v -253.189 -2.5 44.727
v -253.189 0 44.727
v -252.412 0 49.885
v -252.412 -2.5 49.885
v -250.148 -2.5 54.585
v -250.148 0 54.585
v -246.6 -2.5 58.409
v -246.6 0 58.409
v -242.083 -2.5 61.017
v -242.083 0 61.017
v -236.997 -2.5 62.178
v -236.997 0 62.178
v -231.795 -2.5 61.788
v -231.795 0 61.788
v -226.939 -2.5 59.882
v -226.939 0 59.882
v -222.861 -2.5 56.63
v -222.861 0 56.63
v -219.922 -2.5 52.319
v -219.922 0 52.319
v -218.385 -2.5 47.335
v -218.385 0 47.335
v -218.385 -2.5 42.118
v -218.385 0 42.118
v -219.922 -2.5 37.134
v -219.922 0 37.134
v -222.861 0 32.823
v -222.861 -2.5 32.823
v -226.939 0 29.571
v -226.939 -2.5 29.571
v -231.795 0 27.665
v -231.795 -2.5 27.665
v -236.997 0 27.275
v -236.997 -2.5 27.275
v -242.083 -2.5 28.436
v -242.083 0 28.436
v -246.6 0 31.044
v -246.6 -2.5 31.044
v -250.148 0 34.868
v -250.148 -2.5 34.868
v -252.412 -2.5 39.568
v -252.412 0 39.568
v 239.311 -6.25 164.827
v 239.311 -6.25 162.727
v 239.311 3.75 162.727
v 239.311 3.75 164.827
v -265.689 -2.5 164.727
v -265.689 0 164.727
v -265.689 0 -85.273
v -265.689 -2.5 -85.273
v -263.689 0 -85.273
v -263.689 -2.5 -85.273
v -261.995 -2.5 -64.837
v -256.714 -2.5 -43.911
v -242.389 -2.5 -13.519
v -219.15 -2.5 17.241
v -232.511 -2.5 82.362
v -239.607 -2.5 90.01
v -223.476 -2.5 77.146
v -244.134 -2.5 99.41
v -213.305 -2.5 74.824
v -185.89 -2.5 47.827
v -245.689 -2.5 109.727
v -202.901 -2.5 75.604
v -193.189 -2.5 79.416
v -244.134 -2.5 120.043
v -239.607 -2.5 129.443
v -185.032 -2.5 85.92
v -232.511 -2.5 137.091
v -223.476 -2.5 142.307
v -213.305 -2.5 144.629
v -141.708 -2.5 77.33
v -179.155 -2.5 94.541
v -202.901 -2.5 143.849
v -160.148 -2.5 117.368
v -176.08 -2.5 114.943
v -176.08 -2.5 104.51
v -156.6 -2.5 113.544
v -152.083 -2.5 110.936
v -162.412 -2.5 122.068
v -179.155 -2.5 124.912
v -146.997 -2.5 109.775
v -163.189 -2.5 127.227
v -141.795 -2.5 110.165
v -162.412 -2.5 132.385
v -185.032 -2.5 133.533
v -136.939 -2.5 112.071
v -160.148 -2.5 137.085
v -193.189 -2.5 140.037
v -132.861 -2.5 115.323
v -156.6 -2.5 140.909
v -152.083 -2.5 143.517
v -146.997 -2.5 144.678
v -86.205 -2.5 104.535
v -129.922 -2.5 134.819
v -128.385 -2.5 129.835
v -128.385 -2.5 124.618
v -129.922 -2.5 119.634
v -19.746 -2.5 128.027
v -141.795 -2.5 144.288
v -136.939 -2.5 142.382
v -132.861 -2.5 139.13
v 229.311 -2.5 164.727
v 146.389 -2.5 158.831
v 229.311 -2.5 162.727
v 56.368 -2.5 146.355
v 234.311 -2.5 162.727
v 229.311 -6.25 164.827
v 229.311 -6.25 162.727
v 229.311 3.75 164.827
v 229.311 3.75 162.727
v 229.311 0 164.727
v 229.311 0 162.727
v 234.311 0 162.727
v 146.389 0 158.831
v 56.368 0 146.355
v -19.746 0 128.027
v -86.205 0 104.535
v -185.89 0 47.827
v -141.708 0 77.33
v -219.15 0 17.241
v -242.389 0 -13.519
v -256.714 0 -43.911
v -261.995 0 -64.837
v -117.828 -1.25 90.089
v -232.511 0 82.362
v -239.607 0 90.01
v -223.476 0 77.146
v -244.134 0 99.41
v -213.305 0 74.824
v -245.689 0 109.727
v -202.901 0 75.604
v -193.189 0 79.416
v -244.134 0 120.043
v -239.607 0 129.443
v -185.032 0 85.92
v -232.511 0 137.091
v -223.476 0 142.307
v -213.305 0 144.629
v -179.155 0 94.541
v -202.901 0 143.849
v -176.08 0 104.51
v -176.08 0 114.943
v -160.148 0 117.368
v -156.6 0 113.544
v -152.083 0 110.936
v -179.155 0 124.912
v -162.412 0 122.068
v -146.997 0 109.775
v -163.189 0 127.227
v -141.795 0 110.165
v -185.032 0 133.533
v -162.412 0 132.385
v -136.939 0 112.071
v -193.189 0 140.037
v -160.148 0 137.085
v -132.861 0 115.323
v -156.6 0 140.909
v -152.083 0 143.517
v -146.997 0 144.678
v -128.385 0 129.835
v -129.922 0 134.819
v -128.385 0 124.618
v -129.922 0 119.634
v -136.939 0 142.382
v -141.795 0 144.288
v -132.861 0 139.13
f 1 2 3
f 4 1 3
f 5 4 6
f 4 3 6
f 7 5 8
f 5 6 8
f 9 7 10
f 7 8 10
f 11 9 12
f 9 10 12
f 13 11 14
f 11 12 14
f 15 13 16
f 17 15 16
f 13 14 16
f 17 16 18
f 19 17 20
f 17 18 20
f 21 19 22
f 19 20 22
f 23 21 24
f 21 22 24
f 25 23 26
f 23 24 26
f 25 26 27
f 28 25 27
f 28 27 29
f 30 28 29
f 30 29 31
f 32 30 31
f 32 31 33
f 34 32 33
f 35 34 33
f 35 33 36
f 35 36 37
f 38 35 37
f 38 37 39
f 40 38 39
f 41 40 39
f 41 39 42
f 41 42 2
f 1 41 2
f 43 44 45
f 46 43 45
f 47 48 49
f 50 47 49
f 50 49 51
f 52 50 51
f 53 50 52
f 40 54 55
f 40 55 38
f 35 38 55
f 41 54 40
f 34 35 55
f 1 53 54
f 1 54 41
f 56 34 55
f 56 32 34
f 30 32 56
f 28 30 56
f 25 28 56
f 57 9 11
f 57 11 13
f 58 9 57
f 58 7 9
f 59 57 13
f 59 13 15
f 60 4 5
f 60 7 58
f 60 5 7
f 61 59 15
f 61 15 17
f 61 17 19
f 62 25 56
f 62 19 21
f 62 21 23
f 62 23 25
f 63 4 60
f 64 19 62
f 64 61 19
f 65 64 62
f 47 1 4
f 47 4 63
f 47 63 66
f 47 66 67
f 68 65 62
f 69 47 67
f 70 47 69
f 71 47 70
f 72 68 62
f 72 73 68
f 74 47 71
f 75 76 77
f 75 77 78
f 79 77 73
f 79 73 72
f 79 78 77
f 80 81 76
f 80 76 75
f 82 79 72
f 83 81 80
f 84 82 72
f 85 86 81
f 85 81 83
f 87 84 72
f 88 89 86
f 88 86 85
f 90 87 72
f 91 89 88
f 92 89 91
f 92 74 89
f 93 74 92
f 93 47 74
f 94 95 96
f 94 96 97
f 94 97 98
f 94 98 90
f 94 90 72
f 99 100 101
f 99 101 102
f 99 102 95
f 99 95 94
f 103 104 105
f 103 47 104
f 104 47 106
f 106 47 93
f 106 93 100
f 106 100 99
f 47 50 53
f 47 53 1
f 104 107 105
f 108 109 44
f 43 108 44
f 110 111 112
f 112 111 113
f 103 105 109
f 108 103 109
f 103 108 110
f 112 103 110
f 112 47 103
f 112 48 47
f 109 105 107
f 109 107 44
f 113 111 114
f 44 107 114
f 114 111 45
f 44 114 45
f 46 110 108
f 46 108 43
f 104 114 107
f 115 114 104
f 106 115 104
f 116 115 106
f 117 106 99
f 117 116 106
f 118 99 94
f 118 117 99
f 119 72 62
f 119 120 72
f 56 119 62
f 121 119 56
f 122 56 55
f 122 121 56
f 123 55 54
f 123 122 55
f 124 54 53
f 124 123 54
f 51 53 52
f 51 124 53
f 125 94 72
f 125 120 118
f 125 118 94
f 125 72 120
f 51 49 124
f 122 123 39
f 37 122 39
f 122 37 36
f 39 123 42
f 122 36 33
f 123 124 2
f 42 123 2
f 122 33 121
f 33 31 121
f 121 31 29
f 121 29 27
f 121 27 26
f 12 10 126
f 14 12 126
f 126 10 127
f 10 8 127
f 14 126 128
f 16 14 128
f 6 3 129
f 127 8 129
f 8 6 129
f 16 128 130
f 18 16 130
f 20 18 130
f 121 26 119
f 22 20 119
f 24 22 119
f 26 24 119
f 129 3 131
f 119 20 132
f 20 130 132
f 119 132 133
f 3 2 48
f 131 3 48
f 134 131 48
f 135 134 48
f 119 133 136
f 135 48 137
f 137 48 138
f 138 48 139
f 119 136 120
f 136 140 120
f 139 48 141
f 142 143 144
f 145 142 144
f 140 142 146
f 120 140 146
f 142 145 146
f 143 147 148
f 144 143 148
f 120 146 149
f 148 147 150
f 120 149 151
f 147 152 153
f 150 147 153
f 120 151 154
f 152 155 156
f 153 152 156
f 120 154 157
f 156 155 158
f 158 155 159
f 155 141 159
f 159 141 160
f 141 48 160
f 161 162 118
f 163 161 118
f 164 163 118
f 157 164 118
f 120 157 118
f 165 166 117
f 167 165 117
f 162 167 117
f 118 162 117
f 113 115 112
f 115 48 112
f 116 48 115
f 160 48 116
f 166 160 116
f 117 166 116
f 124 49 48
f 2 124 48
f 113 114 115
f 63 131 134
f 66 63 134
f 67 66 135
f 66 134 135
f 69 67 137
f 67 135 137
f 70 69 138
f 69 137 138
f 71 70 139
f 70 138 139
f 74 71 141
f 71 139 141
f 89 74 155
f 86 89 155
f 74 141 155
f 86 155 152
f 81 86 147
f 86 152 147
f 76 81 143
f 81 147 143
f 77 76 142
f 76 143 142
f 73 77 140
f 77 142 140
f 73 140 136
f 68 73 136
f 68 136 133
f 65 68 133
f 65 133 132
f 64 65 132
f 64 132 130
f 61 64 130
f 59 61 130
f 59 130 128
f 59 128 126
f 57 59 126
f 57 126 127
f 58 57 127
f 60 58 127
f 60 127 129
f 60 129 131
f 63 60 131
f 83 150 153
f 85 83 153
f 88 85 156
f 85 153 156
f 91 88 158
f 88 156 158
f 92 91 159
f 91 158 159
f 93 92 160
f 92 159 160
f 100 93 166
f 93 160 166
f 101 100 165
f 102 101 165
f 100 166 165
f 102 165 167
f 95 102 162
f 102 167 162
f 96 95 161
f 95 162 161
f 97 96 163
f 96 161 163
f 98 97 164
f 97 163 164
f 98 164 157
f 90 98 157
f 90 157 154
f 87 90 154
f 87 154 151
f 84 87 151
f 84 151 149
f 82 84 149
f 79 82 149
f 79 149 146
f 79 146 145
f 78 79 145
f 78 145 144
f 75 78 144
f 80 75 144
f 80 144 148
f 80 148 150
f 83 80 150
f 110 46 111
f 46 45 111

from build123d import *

# Parameters (mm, degrees)
F1_DEPTH = 2.5
F3_D     = 70
F4_D     = 35
F5_W     = 5
F5_H     = 2.5
F6_DEPTH = 2
F7_DEPTH = 0.1


with BuildPart() as f1:
    # F0 (on Front) → F1 (new body)
    with BuildSketch(Plane.XZ):
        with BuildLine():
            Line((234.3109268695, 164.7265180945), (-265.6890731305, 164.7265180945))
            Line((-265.6890731305, 164.7265180945), (-265.6890731305, -85.2734819055))
            Line((-265.6890731305, -85.2734819055), (-263.6890731305, -85.2734819055))
            add(Edge.make_bspline(
                [(234.3109268695, 162.7265180945), (-263.6890731305, 162.7265180945), (-263.6890731305, -85.2734819055)],
                knots=[4.7123889804, 4.7123889804, 4.7123889804, 6.2831853072, 6.2831853072, 6.2831853072], degree=2, weights=[1, 0.7071067812, 1]))
            Line((234.3109268695, 162.7265180945), (234.3109268695, 164.7265180945))
        make_face()
    extrude(amount=F1_DEPTH)

    # F3 (through all)
    with Locations(Plane.XZ.offset(2.5)):
        with Locations((-210.6890731305, 109.7265180945)):
            Hole(F3_D / 2)

    # F4 (through all)
    with Locations(Plane.XZ.offset(2.5)):
        with Locations((-145.6890731305, 127.2265180945), (-235.6890731305, 44.7265180945)):
            Hole(F4_D / 2)

    # F5 (on face) → F6 (join)
    with BuildSketch(Plane.XY.offset(164.7265180945)):
        Polygon((239.3109268695, -6.25), (239.3109268695, 3.75), (229.3109268695, 3.75), (229.3109268695, 0), (234.3109268695, 0), (234.3109268695, -2.5), (229.3109268695, -2.5), (229.3109268695, -6.25), align=None)
        with Locations((231.8109268695, -1.25)):
            Rectangle(F5_W, F5_H)
    extrude(amount=-F6_DEPTH)

    # F5 (on face) → F7 (join)
    with BuildSketch(Plane.XY.offset(164.7265180945)):
        Polygon((239.3109268695, -6.25), (239.3109268695, 3.75), (229.3109268695, 3.75), (229.3109268695, 0), (234.3109268695, 0), (234.3109268695, -2.5), (229.3109268695, -2.5), (229.3109268695, -6.25), align=None)
        with Locations((231.8109268695, -1.25)):
            Rectangle(F5_W, F5_H)
    extrude(amount=F7_DEPTH)


solid = f1.part
